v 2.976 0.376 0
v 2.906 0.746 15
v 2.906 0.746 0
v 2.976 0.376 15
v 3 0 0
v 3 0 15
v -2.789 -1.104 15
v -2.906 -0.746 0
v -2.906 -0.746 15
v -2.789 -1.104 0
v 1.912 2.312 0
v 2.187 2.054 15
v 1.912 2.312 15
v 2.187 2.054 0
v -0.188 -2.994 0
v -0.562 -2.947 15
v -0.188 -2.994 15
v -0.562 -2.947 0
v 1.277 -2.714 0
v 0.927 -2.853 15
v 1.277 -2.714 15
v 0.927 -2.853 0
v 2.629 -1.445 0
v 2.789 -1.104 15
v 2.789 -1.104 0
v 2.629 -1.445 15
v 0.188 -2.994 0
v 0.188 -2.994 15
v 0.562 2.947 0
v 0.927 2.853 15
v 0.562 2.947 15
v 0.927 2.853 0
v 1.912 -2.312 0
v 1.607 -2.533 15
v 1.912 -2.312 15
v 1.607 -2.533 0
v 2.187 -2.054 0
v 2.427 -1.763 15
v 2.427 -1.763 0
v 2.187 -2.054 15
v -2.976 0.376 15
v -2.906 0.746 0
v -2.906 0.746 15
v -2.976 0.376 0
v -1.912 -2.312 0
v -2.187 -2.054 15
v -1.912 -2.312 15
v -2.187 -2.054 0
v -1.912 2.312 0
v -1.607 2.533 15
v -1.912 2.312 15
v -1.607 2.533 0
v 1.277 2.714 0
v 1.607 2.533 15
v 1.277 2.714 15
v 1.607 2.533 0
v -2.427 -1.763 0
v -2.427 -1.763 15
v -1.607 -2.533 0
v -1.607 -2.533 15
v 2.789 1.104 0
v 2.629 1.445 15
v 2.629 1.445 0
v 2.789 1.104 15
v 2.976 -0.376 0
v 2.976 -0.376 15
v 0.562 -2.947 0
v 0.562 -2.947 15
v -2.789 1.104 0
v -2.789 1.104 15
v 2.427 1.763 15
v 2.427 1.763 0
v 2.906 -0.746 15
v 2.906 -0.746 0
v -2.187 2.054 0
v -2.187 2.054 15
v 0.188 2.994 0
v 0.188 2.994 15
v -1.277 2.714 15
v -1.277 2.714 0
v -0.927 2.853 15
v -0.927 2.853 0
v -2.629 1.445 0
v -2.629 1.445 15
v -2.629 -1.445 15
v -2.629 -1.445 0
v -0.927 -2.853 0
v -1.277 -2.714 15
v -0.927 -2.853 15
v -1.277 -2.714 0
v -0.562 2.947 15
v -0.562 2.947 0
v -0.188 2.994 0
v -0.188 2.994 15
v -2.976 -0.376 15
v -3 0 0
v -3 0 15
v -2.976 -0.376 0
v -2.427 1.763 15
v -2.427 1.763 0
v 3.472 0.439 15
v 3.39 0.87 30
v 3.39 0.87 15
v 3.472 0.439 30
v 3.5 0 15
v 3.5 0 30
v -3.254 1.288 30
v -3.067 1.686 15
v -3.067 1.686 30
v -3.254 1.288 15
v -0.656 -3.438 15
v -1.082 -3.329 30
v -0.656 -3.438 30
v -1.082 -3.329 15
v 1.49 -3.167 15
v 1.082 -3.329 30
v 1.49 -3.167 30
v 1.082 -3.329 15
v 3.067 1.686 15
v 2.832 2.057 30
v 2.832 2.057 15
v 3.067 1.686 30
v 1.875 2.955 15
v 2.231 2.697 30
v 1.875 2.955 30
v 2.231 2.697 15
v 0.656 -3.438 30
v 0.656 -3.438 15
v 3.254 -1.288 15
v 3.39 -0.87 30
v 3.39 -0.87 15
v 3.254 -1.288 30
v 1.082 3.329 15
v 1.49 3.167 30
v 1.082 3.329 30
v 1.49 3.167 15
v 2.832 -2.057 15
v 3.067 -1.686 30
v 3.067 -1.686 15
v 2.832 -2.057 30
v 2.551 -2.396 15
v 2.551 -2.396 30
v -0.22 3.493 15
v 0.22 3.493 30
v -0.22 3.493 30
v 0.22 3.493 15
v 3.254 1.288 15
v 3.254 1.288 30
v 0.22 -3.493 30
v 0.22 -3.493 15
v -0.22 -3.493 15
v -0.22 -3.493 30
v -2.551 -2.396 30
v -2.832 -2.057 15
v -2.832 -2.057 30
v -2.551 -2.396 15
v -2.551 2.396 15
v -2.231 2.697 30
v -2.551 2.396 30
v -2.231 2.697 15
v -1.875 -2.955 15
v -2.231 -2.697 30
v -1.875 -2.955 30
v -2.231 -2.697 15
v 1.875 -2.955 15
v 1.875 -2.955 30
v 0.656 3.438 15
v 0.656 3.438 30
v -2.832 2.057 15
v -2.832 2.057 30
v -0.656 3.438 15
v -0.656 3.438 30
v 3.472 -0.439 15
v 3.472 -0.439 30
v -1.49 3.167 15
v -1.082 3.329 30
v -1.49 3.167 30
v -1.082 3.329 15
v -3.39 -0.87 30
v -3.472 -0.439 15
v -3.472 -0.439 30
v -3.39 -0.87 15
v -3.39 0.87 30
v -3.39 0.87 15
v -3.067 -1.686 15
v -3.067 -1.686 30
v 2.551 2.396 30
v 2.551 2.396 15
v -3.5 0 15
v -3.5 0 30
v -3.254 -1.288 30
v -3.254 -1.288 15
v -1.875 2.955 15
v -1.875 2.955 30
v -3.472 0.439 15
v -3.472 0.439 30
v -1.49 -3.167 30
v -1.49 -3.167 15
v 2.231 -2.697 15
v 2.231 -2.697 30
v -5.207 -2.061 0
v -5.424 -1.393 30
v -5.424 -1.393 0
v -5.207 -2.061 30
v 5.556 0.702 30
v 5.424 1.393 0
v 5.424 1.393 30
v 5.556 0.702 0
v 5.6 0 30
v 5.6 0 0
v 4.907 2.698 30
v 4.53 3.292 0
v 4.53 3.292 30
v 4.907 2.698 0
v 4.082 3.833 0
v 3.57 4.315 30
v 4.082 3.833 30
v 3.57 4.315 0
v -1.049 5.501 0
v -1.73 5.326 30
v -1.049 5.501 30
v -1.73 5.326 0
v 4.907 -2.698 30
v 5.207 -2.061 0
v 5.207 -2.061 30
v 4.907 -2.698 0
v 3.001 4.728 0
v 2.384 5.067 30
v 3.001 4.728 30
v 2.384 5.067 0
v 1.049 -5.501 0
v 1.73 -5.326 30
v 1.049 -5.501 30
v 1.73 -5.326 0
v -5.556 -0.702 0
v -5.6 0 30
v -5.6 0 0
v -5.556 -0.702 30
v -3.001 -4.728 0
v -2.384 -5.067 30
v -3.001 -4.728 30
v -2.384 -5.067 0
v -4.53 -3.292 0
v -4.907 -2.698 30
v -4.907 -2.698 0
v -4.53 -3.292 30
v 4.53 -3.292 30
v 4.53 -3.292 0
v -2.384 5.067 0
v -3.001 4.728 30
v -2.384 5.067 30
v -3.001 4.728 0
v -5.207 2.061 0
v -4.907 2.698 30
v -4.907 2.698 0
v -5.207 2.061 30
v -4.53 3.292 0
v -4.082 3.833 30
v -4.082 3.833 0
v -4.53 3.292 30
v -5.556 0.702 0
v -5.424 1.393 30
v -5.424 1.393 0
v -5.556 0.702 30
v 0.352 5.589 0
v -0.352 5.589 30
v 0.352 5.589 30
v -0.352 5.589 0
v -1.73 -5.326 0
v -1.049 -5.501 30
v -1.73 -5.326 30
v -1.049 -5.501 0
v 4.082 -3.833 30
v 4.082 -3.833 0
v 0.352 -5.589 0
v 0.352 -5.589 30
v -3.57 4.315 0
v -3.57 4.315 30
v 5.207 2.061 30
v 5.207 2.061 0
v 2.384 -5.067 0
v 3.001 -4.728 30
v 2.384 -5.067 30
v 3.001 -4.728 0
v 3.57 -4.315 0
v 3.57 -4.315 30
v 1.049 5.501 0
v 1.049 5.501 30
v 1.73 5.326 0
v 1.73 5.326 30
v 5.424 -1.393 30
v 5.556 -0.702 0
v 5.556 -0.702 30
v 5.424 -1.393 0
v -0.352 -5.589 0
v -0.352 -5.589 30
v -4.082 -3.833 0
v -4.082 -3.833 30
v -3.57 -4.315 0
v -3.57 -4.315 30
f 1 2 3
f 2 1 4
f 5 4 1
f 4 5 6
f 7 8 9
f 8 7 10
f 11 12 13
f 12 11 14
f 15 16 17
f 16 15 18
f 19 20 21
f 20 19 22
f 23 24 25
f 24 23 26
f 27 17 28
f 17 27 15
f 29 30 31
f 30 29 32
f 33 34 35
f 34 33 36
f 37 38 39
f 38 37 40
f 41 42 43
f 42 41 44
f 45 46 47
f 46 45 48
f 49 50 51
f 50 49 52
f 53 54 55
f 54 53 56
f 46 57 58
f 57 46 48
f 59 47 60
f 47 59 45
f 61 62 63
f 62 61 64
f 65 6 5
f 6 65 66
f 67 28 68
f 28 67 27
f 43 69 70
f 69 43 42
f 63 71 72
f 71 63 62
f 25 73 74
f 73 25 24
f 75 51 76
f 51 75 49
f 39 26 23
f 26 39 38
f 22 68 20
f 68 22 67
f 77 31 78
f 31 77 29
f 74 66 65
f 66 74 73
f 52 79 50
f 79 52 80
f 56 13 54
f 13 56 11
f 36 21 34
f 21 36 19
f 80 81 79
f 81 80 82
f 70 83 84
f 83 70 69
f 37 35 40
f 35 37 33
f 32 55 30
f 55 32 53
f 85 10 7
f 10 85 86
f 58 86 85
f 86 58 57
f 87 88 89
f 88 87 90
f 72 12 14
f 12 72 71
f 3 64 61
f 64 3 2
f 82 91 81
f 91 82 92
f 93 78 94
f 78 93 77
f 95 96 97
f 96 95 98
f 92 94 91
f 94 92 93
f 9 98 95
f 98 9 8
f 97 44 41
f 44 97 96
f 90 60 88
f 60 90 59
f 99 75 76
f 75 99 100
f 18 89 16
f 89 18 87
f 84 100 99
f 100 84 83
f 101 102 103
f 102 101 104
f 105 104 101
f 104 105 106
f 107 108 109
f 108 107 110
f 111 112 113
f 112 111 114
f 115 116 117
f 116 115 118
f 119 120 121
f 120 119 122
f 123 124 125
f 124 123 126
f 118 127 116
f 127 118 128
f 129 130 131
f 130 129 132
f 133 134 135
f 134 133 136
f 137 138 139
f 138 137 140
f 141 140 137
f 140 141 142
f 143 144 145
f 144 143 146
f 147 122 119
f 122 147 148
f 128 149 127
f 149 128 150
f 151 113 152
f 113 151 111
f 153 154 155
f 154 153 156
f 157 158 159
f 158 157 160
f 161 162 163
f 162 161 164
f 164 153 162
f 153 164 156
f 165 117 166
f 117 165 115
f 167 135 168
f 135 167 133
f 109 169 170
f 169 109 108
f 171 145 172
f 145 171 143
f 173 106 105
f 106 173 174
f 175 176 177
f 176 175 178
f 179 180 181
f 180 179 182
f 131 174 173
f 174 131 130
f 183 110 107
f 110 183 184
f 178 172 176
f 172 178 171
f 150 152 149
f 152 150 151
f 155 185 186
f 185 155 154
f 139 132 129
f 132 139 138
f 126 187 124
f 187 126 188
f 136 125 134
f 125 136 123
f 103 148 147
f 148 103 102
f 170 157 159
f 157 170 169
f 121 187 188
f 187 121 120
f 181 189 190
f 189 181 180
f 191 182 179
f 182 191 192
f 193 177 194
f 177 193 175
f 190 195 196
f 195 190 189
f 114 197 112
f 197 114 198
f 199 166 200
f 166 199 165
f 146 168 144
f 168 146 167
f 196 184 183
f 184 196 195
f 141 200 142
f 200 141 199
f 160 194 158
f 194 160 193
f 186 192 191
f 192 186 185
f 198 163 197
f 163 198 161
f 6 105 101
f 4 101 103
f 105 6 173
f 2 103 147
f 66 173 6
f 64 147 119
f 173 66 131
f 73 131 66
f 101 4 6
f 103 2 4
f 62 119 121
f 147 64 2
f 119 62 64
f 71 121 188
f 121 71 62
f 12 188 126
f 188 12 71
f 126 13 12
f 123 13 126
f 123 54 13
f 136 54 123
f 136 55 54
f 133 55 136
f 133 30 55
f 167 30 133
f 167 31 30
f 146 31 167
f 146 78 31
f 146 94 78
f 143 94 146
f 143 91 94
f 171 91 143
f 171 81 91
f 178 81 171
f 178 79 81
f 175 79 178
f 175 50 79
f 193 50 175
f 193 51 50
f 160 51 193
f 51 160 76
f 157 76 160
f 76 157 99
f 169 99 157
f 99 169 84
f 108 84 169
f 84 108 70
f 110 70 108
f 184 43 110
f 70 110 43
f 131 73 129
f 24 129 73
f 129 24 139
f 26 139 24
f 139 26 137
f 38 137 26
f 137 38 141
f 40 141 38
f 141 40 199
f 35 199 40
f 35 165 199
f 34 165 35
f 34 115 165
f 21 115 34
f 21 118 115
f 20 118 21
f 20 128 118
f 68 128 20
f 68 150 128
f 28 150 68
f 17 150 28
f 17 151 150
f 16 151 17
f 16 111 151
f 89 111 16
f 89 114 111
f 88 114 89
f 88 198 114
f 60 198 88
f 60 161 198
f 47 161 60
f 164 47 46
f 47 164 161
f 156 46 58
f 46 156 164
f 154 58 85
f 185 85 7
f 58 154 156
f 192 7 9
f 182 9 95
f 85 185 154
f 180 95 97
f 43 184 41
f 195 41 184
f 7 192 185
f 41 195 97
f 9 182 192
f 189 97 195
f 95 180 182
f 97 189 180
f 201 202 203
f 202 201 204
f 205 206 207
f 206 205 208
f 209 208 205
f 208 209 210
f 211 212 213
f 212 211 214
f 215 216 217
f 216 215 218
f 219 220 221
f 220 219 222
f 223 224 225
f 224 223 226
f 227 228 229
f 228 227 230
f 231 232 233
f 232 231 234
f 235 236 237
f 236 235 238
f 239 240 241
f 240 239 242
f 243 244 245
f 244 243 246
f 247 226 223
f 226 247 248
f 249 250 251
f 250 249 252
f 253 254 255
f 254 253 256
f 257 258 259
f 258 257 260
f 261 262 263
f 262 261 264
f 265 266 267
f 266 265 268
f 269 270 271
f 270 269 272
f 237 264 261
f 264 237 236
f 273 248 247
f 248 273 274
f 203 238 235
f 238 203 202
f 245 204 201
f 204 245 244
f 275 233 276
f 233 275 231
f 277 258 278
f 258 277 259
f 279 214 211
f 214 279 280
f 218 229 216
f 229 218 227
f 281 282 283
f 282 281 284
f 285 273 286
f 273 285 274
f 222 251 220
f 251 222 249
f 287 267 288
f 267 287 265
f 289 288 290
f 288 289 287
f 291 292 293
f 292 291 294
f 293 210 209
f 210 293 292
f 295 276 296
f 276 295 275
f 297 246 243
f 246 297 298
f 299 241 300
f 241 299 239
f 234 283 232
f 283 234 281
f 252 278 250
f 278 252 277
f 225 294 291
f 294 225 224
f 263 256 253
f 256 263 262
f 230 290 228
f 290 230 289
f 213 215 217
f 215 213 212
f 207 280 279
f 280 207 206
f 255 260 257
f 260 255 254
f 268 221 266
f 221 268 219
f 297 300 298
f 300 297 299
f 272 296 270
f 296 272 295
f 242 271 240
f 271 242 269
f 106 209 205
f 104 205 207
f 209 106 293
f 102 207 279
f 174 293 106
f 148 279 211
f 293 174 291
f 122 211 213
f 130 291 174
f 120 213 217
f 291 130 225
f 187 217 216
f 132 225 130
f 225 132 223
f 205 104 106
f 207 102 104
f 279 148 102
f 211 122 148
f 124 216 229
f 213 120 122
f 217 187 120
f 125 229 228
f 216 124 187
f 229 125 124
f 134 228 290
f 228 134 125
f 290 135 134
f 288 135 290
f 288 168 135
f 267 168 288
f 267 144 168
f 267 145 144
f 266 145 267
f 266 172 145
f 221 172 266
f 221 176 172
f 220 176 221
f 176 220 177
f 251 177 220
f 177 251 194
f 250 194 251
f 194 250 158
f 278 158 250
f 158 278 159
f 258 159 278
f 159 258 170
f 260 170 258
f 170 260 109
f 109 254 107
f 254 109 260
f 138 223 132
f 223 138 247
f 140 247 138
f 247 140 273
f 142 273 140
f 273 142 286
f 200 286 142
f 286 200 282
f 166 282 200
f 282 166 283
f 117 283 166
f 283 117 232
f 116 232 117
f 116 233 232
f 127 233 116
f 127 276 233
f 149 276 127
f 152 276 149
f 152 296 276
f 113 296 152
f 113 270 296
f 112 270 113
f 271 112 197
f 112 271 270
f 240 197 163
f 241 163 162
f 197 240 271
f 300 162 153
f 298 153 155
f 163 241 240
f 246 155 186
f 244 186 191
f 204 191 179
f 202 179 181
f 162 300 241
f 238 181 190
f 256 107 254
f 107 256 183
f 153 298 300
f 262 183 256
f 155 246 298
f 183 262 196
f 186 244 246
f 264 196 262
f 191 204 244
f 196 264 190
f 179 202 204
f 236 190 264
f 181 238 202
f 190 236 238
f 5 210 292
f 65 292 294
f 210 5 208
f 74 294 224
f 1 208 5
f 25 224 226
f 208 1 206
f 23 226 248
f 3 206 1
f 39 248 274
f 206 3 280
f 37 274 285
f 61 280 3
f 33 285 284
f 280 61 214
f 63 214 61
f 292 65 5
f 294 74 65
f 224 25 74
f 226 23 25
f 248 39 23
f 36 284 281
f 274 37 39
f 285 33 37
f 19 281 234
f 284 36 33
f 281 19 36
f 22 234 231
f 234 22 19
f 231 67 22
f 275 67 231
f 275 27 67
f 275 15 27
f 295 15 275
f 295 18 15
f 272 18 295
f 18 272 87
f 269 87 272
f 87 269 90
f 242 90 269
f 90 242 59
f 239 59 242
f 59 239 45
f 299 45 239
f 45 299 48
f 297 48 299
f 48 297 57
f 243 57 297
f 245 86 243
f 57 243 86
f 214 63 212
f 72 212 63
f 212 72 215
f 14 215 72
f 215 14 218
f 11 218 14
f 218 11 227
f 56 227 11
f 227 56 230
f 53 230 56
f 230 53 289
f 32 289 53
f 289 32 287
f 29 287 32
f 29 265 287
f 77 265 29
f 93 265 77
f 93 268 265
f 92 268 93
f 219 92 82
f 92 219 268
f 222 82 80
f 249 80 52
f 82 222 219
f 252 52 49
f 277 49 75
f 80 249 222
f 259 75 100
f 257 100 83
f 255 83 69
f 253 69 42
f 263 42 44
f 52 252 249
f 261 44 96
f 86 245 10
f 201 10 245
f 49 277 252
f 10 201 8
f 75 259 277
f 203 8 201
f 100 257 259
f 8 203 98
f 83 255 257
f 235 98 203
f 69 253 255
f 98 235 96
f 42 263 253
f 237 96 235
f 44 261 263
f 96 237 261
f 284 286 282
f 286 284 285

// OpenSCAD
//Rod_connector V4 for Rostock / Kossel Printers. 
// (c) g3org

// What type of object should be generated?
generate = "Round"; // [Round,Square]

//mm
Rod_diameter_outside=6; //

//mm 
Jaws_diameter_outside=7; //

// object height mm
height=30; 

// Wall_thickness
Wall_thickness=2;


/* [Hidden] */
$fn=50;

//inputs end

// cylinder object


module cylinder_full(){
	if (Rod_diameter_outside <= Jaws_diameter_outside){
					cylinder(h=height,r=Jaws_diameter_outside/2+Wall_thickness+0.1);
				}
				else{
					cylinder(h=height,r=Jaws_diameter_outside/2+Wall_thickness+0.1);
				}
}

module cylinder_final(){

		difference(){
			cylinder_full();
			inlay();
		}

}








//cube object
module cube_full(){
	difference(){
		linear_extrude(height = height){
			minkowski(){
				if (Rod_diameter_outside <= Jaws_diameter_outside){
				   square(Jaws_diameter_outside+Wall_thickness-2,center=true);
				}
				else{
					square(Rod_diameter_outside+Wall_thickness-2,center=true);
				}
				circle(1);
				}
		}
	}

}
module inlay(){

		translate([0,0,-1]){
				cylinder (h=height/2+2,r=Rod_diameter_outside/2);
				}
		translate([0,0,height/2]){
				cylinder (h=height/2+1,r=Jaws_diameter_outside/2);
		}
}


module cube_Final(){
	difference(){
		cube_full();
		inlay();
	}

}


////////////////////////////////////////////////////////////////////////////////
// Main


if (generate=="Round") {
	cylinder_final();
		
	
}
else if (generate=="Square"){
	cube_Final();
}


